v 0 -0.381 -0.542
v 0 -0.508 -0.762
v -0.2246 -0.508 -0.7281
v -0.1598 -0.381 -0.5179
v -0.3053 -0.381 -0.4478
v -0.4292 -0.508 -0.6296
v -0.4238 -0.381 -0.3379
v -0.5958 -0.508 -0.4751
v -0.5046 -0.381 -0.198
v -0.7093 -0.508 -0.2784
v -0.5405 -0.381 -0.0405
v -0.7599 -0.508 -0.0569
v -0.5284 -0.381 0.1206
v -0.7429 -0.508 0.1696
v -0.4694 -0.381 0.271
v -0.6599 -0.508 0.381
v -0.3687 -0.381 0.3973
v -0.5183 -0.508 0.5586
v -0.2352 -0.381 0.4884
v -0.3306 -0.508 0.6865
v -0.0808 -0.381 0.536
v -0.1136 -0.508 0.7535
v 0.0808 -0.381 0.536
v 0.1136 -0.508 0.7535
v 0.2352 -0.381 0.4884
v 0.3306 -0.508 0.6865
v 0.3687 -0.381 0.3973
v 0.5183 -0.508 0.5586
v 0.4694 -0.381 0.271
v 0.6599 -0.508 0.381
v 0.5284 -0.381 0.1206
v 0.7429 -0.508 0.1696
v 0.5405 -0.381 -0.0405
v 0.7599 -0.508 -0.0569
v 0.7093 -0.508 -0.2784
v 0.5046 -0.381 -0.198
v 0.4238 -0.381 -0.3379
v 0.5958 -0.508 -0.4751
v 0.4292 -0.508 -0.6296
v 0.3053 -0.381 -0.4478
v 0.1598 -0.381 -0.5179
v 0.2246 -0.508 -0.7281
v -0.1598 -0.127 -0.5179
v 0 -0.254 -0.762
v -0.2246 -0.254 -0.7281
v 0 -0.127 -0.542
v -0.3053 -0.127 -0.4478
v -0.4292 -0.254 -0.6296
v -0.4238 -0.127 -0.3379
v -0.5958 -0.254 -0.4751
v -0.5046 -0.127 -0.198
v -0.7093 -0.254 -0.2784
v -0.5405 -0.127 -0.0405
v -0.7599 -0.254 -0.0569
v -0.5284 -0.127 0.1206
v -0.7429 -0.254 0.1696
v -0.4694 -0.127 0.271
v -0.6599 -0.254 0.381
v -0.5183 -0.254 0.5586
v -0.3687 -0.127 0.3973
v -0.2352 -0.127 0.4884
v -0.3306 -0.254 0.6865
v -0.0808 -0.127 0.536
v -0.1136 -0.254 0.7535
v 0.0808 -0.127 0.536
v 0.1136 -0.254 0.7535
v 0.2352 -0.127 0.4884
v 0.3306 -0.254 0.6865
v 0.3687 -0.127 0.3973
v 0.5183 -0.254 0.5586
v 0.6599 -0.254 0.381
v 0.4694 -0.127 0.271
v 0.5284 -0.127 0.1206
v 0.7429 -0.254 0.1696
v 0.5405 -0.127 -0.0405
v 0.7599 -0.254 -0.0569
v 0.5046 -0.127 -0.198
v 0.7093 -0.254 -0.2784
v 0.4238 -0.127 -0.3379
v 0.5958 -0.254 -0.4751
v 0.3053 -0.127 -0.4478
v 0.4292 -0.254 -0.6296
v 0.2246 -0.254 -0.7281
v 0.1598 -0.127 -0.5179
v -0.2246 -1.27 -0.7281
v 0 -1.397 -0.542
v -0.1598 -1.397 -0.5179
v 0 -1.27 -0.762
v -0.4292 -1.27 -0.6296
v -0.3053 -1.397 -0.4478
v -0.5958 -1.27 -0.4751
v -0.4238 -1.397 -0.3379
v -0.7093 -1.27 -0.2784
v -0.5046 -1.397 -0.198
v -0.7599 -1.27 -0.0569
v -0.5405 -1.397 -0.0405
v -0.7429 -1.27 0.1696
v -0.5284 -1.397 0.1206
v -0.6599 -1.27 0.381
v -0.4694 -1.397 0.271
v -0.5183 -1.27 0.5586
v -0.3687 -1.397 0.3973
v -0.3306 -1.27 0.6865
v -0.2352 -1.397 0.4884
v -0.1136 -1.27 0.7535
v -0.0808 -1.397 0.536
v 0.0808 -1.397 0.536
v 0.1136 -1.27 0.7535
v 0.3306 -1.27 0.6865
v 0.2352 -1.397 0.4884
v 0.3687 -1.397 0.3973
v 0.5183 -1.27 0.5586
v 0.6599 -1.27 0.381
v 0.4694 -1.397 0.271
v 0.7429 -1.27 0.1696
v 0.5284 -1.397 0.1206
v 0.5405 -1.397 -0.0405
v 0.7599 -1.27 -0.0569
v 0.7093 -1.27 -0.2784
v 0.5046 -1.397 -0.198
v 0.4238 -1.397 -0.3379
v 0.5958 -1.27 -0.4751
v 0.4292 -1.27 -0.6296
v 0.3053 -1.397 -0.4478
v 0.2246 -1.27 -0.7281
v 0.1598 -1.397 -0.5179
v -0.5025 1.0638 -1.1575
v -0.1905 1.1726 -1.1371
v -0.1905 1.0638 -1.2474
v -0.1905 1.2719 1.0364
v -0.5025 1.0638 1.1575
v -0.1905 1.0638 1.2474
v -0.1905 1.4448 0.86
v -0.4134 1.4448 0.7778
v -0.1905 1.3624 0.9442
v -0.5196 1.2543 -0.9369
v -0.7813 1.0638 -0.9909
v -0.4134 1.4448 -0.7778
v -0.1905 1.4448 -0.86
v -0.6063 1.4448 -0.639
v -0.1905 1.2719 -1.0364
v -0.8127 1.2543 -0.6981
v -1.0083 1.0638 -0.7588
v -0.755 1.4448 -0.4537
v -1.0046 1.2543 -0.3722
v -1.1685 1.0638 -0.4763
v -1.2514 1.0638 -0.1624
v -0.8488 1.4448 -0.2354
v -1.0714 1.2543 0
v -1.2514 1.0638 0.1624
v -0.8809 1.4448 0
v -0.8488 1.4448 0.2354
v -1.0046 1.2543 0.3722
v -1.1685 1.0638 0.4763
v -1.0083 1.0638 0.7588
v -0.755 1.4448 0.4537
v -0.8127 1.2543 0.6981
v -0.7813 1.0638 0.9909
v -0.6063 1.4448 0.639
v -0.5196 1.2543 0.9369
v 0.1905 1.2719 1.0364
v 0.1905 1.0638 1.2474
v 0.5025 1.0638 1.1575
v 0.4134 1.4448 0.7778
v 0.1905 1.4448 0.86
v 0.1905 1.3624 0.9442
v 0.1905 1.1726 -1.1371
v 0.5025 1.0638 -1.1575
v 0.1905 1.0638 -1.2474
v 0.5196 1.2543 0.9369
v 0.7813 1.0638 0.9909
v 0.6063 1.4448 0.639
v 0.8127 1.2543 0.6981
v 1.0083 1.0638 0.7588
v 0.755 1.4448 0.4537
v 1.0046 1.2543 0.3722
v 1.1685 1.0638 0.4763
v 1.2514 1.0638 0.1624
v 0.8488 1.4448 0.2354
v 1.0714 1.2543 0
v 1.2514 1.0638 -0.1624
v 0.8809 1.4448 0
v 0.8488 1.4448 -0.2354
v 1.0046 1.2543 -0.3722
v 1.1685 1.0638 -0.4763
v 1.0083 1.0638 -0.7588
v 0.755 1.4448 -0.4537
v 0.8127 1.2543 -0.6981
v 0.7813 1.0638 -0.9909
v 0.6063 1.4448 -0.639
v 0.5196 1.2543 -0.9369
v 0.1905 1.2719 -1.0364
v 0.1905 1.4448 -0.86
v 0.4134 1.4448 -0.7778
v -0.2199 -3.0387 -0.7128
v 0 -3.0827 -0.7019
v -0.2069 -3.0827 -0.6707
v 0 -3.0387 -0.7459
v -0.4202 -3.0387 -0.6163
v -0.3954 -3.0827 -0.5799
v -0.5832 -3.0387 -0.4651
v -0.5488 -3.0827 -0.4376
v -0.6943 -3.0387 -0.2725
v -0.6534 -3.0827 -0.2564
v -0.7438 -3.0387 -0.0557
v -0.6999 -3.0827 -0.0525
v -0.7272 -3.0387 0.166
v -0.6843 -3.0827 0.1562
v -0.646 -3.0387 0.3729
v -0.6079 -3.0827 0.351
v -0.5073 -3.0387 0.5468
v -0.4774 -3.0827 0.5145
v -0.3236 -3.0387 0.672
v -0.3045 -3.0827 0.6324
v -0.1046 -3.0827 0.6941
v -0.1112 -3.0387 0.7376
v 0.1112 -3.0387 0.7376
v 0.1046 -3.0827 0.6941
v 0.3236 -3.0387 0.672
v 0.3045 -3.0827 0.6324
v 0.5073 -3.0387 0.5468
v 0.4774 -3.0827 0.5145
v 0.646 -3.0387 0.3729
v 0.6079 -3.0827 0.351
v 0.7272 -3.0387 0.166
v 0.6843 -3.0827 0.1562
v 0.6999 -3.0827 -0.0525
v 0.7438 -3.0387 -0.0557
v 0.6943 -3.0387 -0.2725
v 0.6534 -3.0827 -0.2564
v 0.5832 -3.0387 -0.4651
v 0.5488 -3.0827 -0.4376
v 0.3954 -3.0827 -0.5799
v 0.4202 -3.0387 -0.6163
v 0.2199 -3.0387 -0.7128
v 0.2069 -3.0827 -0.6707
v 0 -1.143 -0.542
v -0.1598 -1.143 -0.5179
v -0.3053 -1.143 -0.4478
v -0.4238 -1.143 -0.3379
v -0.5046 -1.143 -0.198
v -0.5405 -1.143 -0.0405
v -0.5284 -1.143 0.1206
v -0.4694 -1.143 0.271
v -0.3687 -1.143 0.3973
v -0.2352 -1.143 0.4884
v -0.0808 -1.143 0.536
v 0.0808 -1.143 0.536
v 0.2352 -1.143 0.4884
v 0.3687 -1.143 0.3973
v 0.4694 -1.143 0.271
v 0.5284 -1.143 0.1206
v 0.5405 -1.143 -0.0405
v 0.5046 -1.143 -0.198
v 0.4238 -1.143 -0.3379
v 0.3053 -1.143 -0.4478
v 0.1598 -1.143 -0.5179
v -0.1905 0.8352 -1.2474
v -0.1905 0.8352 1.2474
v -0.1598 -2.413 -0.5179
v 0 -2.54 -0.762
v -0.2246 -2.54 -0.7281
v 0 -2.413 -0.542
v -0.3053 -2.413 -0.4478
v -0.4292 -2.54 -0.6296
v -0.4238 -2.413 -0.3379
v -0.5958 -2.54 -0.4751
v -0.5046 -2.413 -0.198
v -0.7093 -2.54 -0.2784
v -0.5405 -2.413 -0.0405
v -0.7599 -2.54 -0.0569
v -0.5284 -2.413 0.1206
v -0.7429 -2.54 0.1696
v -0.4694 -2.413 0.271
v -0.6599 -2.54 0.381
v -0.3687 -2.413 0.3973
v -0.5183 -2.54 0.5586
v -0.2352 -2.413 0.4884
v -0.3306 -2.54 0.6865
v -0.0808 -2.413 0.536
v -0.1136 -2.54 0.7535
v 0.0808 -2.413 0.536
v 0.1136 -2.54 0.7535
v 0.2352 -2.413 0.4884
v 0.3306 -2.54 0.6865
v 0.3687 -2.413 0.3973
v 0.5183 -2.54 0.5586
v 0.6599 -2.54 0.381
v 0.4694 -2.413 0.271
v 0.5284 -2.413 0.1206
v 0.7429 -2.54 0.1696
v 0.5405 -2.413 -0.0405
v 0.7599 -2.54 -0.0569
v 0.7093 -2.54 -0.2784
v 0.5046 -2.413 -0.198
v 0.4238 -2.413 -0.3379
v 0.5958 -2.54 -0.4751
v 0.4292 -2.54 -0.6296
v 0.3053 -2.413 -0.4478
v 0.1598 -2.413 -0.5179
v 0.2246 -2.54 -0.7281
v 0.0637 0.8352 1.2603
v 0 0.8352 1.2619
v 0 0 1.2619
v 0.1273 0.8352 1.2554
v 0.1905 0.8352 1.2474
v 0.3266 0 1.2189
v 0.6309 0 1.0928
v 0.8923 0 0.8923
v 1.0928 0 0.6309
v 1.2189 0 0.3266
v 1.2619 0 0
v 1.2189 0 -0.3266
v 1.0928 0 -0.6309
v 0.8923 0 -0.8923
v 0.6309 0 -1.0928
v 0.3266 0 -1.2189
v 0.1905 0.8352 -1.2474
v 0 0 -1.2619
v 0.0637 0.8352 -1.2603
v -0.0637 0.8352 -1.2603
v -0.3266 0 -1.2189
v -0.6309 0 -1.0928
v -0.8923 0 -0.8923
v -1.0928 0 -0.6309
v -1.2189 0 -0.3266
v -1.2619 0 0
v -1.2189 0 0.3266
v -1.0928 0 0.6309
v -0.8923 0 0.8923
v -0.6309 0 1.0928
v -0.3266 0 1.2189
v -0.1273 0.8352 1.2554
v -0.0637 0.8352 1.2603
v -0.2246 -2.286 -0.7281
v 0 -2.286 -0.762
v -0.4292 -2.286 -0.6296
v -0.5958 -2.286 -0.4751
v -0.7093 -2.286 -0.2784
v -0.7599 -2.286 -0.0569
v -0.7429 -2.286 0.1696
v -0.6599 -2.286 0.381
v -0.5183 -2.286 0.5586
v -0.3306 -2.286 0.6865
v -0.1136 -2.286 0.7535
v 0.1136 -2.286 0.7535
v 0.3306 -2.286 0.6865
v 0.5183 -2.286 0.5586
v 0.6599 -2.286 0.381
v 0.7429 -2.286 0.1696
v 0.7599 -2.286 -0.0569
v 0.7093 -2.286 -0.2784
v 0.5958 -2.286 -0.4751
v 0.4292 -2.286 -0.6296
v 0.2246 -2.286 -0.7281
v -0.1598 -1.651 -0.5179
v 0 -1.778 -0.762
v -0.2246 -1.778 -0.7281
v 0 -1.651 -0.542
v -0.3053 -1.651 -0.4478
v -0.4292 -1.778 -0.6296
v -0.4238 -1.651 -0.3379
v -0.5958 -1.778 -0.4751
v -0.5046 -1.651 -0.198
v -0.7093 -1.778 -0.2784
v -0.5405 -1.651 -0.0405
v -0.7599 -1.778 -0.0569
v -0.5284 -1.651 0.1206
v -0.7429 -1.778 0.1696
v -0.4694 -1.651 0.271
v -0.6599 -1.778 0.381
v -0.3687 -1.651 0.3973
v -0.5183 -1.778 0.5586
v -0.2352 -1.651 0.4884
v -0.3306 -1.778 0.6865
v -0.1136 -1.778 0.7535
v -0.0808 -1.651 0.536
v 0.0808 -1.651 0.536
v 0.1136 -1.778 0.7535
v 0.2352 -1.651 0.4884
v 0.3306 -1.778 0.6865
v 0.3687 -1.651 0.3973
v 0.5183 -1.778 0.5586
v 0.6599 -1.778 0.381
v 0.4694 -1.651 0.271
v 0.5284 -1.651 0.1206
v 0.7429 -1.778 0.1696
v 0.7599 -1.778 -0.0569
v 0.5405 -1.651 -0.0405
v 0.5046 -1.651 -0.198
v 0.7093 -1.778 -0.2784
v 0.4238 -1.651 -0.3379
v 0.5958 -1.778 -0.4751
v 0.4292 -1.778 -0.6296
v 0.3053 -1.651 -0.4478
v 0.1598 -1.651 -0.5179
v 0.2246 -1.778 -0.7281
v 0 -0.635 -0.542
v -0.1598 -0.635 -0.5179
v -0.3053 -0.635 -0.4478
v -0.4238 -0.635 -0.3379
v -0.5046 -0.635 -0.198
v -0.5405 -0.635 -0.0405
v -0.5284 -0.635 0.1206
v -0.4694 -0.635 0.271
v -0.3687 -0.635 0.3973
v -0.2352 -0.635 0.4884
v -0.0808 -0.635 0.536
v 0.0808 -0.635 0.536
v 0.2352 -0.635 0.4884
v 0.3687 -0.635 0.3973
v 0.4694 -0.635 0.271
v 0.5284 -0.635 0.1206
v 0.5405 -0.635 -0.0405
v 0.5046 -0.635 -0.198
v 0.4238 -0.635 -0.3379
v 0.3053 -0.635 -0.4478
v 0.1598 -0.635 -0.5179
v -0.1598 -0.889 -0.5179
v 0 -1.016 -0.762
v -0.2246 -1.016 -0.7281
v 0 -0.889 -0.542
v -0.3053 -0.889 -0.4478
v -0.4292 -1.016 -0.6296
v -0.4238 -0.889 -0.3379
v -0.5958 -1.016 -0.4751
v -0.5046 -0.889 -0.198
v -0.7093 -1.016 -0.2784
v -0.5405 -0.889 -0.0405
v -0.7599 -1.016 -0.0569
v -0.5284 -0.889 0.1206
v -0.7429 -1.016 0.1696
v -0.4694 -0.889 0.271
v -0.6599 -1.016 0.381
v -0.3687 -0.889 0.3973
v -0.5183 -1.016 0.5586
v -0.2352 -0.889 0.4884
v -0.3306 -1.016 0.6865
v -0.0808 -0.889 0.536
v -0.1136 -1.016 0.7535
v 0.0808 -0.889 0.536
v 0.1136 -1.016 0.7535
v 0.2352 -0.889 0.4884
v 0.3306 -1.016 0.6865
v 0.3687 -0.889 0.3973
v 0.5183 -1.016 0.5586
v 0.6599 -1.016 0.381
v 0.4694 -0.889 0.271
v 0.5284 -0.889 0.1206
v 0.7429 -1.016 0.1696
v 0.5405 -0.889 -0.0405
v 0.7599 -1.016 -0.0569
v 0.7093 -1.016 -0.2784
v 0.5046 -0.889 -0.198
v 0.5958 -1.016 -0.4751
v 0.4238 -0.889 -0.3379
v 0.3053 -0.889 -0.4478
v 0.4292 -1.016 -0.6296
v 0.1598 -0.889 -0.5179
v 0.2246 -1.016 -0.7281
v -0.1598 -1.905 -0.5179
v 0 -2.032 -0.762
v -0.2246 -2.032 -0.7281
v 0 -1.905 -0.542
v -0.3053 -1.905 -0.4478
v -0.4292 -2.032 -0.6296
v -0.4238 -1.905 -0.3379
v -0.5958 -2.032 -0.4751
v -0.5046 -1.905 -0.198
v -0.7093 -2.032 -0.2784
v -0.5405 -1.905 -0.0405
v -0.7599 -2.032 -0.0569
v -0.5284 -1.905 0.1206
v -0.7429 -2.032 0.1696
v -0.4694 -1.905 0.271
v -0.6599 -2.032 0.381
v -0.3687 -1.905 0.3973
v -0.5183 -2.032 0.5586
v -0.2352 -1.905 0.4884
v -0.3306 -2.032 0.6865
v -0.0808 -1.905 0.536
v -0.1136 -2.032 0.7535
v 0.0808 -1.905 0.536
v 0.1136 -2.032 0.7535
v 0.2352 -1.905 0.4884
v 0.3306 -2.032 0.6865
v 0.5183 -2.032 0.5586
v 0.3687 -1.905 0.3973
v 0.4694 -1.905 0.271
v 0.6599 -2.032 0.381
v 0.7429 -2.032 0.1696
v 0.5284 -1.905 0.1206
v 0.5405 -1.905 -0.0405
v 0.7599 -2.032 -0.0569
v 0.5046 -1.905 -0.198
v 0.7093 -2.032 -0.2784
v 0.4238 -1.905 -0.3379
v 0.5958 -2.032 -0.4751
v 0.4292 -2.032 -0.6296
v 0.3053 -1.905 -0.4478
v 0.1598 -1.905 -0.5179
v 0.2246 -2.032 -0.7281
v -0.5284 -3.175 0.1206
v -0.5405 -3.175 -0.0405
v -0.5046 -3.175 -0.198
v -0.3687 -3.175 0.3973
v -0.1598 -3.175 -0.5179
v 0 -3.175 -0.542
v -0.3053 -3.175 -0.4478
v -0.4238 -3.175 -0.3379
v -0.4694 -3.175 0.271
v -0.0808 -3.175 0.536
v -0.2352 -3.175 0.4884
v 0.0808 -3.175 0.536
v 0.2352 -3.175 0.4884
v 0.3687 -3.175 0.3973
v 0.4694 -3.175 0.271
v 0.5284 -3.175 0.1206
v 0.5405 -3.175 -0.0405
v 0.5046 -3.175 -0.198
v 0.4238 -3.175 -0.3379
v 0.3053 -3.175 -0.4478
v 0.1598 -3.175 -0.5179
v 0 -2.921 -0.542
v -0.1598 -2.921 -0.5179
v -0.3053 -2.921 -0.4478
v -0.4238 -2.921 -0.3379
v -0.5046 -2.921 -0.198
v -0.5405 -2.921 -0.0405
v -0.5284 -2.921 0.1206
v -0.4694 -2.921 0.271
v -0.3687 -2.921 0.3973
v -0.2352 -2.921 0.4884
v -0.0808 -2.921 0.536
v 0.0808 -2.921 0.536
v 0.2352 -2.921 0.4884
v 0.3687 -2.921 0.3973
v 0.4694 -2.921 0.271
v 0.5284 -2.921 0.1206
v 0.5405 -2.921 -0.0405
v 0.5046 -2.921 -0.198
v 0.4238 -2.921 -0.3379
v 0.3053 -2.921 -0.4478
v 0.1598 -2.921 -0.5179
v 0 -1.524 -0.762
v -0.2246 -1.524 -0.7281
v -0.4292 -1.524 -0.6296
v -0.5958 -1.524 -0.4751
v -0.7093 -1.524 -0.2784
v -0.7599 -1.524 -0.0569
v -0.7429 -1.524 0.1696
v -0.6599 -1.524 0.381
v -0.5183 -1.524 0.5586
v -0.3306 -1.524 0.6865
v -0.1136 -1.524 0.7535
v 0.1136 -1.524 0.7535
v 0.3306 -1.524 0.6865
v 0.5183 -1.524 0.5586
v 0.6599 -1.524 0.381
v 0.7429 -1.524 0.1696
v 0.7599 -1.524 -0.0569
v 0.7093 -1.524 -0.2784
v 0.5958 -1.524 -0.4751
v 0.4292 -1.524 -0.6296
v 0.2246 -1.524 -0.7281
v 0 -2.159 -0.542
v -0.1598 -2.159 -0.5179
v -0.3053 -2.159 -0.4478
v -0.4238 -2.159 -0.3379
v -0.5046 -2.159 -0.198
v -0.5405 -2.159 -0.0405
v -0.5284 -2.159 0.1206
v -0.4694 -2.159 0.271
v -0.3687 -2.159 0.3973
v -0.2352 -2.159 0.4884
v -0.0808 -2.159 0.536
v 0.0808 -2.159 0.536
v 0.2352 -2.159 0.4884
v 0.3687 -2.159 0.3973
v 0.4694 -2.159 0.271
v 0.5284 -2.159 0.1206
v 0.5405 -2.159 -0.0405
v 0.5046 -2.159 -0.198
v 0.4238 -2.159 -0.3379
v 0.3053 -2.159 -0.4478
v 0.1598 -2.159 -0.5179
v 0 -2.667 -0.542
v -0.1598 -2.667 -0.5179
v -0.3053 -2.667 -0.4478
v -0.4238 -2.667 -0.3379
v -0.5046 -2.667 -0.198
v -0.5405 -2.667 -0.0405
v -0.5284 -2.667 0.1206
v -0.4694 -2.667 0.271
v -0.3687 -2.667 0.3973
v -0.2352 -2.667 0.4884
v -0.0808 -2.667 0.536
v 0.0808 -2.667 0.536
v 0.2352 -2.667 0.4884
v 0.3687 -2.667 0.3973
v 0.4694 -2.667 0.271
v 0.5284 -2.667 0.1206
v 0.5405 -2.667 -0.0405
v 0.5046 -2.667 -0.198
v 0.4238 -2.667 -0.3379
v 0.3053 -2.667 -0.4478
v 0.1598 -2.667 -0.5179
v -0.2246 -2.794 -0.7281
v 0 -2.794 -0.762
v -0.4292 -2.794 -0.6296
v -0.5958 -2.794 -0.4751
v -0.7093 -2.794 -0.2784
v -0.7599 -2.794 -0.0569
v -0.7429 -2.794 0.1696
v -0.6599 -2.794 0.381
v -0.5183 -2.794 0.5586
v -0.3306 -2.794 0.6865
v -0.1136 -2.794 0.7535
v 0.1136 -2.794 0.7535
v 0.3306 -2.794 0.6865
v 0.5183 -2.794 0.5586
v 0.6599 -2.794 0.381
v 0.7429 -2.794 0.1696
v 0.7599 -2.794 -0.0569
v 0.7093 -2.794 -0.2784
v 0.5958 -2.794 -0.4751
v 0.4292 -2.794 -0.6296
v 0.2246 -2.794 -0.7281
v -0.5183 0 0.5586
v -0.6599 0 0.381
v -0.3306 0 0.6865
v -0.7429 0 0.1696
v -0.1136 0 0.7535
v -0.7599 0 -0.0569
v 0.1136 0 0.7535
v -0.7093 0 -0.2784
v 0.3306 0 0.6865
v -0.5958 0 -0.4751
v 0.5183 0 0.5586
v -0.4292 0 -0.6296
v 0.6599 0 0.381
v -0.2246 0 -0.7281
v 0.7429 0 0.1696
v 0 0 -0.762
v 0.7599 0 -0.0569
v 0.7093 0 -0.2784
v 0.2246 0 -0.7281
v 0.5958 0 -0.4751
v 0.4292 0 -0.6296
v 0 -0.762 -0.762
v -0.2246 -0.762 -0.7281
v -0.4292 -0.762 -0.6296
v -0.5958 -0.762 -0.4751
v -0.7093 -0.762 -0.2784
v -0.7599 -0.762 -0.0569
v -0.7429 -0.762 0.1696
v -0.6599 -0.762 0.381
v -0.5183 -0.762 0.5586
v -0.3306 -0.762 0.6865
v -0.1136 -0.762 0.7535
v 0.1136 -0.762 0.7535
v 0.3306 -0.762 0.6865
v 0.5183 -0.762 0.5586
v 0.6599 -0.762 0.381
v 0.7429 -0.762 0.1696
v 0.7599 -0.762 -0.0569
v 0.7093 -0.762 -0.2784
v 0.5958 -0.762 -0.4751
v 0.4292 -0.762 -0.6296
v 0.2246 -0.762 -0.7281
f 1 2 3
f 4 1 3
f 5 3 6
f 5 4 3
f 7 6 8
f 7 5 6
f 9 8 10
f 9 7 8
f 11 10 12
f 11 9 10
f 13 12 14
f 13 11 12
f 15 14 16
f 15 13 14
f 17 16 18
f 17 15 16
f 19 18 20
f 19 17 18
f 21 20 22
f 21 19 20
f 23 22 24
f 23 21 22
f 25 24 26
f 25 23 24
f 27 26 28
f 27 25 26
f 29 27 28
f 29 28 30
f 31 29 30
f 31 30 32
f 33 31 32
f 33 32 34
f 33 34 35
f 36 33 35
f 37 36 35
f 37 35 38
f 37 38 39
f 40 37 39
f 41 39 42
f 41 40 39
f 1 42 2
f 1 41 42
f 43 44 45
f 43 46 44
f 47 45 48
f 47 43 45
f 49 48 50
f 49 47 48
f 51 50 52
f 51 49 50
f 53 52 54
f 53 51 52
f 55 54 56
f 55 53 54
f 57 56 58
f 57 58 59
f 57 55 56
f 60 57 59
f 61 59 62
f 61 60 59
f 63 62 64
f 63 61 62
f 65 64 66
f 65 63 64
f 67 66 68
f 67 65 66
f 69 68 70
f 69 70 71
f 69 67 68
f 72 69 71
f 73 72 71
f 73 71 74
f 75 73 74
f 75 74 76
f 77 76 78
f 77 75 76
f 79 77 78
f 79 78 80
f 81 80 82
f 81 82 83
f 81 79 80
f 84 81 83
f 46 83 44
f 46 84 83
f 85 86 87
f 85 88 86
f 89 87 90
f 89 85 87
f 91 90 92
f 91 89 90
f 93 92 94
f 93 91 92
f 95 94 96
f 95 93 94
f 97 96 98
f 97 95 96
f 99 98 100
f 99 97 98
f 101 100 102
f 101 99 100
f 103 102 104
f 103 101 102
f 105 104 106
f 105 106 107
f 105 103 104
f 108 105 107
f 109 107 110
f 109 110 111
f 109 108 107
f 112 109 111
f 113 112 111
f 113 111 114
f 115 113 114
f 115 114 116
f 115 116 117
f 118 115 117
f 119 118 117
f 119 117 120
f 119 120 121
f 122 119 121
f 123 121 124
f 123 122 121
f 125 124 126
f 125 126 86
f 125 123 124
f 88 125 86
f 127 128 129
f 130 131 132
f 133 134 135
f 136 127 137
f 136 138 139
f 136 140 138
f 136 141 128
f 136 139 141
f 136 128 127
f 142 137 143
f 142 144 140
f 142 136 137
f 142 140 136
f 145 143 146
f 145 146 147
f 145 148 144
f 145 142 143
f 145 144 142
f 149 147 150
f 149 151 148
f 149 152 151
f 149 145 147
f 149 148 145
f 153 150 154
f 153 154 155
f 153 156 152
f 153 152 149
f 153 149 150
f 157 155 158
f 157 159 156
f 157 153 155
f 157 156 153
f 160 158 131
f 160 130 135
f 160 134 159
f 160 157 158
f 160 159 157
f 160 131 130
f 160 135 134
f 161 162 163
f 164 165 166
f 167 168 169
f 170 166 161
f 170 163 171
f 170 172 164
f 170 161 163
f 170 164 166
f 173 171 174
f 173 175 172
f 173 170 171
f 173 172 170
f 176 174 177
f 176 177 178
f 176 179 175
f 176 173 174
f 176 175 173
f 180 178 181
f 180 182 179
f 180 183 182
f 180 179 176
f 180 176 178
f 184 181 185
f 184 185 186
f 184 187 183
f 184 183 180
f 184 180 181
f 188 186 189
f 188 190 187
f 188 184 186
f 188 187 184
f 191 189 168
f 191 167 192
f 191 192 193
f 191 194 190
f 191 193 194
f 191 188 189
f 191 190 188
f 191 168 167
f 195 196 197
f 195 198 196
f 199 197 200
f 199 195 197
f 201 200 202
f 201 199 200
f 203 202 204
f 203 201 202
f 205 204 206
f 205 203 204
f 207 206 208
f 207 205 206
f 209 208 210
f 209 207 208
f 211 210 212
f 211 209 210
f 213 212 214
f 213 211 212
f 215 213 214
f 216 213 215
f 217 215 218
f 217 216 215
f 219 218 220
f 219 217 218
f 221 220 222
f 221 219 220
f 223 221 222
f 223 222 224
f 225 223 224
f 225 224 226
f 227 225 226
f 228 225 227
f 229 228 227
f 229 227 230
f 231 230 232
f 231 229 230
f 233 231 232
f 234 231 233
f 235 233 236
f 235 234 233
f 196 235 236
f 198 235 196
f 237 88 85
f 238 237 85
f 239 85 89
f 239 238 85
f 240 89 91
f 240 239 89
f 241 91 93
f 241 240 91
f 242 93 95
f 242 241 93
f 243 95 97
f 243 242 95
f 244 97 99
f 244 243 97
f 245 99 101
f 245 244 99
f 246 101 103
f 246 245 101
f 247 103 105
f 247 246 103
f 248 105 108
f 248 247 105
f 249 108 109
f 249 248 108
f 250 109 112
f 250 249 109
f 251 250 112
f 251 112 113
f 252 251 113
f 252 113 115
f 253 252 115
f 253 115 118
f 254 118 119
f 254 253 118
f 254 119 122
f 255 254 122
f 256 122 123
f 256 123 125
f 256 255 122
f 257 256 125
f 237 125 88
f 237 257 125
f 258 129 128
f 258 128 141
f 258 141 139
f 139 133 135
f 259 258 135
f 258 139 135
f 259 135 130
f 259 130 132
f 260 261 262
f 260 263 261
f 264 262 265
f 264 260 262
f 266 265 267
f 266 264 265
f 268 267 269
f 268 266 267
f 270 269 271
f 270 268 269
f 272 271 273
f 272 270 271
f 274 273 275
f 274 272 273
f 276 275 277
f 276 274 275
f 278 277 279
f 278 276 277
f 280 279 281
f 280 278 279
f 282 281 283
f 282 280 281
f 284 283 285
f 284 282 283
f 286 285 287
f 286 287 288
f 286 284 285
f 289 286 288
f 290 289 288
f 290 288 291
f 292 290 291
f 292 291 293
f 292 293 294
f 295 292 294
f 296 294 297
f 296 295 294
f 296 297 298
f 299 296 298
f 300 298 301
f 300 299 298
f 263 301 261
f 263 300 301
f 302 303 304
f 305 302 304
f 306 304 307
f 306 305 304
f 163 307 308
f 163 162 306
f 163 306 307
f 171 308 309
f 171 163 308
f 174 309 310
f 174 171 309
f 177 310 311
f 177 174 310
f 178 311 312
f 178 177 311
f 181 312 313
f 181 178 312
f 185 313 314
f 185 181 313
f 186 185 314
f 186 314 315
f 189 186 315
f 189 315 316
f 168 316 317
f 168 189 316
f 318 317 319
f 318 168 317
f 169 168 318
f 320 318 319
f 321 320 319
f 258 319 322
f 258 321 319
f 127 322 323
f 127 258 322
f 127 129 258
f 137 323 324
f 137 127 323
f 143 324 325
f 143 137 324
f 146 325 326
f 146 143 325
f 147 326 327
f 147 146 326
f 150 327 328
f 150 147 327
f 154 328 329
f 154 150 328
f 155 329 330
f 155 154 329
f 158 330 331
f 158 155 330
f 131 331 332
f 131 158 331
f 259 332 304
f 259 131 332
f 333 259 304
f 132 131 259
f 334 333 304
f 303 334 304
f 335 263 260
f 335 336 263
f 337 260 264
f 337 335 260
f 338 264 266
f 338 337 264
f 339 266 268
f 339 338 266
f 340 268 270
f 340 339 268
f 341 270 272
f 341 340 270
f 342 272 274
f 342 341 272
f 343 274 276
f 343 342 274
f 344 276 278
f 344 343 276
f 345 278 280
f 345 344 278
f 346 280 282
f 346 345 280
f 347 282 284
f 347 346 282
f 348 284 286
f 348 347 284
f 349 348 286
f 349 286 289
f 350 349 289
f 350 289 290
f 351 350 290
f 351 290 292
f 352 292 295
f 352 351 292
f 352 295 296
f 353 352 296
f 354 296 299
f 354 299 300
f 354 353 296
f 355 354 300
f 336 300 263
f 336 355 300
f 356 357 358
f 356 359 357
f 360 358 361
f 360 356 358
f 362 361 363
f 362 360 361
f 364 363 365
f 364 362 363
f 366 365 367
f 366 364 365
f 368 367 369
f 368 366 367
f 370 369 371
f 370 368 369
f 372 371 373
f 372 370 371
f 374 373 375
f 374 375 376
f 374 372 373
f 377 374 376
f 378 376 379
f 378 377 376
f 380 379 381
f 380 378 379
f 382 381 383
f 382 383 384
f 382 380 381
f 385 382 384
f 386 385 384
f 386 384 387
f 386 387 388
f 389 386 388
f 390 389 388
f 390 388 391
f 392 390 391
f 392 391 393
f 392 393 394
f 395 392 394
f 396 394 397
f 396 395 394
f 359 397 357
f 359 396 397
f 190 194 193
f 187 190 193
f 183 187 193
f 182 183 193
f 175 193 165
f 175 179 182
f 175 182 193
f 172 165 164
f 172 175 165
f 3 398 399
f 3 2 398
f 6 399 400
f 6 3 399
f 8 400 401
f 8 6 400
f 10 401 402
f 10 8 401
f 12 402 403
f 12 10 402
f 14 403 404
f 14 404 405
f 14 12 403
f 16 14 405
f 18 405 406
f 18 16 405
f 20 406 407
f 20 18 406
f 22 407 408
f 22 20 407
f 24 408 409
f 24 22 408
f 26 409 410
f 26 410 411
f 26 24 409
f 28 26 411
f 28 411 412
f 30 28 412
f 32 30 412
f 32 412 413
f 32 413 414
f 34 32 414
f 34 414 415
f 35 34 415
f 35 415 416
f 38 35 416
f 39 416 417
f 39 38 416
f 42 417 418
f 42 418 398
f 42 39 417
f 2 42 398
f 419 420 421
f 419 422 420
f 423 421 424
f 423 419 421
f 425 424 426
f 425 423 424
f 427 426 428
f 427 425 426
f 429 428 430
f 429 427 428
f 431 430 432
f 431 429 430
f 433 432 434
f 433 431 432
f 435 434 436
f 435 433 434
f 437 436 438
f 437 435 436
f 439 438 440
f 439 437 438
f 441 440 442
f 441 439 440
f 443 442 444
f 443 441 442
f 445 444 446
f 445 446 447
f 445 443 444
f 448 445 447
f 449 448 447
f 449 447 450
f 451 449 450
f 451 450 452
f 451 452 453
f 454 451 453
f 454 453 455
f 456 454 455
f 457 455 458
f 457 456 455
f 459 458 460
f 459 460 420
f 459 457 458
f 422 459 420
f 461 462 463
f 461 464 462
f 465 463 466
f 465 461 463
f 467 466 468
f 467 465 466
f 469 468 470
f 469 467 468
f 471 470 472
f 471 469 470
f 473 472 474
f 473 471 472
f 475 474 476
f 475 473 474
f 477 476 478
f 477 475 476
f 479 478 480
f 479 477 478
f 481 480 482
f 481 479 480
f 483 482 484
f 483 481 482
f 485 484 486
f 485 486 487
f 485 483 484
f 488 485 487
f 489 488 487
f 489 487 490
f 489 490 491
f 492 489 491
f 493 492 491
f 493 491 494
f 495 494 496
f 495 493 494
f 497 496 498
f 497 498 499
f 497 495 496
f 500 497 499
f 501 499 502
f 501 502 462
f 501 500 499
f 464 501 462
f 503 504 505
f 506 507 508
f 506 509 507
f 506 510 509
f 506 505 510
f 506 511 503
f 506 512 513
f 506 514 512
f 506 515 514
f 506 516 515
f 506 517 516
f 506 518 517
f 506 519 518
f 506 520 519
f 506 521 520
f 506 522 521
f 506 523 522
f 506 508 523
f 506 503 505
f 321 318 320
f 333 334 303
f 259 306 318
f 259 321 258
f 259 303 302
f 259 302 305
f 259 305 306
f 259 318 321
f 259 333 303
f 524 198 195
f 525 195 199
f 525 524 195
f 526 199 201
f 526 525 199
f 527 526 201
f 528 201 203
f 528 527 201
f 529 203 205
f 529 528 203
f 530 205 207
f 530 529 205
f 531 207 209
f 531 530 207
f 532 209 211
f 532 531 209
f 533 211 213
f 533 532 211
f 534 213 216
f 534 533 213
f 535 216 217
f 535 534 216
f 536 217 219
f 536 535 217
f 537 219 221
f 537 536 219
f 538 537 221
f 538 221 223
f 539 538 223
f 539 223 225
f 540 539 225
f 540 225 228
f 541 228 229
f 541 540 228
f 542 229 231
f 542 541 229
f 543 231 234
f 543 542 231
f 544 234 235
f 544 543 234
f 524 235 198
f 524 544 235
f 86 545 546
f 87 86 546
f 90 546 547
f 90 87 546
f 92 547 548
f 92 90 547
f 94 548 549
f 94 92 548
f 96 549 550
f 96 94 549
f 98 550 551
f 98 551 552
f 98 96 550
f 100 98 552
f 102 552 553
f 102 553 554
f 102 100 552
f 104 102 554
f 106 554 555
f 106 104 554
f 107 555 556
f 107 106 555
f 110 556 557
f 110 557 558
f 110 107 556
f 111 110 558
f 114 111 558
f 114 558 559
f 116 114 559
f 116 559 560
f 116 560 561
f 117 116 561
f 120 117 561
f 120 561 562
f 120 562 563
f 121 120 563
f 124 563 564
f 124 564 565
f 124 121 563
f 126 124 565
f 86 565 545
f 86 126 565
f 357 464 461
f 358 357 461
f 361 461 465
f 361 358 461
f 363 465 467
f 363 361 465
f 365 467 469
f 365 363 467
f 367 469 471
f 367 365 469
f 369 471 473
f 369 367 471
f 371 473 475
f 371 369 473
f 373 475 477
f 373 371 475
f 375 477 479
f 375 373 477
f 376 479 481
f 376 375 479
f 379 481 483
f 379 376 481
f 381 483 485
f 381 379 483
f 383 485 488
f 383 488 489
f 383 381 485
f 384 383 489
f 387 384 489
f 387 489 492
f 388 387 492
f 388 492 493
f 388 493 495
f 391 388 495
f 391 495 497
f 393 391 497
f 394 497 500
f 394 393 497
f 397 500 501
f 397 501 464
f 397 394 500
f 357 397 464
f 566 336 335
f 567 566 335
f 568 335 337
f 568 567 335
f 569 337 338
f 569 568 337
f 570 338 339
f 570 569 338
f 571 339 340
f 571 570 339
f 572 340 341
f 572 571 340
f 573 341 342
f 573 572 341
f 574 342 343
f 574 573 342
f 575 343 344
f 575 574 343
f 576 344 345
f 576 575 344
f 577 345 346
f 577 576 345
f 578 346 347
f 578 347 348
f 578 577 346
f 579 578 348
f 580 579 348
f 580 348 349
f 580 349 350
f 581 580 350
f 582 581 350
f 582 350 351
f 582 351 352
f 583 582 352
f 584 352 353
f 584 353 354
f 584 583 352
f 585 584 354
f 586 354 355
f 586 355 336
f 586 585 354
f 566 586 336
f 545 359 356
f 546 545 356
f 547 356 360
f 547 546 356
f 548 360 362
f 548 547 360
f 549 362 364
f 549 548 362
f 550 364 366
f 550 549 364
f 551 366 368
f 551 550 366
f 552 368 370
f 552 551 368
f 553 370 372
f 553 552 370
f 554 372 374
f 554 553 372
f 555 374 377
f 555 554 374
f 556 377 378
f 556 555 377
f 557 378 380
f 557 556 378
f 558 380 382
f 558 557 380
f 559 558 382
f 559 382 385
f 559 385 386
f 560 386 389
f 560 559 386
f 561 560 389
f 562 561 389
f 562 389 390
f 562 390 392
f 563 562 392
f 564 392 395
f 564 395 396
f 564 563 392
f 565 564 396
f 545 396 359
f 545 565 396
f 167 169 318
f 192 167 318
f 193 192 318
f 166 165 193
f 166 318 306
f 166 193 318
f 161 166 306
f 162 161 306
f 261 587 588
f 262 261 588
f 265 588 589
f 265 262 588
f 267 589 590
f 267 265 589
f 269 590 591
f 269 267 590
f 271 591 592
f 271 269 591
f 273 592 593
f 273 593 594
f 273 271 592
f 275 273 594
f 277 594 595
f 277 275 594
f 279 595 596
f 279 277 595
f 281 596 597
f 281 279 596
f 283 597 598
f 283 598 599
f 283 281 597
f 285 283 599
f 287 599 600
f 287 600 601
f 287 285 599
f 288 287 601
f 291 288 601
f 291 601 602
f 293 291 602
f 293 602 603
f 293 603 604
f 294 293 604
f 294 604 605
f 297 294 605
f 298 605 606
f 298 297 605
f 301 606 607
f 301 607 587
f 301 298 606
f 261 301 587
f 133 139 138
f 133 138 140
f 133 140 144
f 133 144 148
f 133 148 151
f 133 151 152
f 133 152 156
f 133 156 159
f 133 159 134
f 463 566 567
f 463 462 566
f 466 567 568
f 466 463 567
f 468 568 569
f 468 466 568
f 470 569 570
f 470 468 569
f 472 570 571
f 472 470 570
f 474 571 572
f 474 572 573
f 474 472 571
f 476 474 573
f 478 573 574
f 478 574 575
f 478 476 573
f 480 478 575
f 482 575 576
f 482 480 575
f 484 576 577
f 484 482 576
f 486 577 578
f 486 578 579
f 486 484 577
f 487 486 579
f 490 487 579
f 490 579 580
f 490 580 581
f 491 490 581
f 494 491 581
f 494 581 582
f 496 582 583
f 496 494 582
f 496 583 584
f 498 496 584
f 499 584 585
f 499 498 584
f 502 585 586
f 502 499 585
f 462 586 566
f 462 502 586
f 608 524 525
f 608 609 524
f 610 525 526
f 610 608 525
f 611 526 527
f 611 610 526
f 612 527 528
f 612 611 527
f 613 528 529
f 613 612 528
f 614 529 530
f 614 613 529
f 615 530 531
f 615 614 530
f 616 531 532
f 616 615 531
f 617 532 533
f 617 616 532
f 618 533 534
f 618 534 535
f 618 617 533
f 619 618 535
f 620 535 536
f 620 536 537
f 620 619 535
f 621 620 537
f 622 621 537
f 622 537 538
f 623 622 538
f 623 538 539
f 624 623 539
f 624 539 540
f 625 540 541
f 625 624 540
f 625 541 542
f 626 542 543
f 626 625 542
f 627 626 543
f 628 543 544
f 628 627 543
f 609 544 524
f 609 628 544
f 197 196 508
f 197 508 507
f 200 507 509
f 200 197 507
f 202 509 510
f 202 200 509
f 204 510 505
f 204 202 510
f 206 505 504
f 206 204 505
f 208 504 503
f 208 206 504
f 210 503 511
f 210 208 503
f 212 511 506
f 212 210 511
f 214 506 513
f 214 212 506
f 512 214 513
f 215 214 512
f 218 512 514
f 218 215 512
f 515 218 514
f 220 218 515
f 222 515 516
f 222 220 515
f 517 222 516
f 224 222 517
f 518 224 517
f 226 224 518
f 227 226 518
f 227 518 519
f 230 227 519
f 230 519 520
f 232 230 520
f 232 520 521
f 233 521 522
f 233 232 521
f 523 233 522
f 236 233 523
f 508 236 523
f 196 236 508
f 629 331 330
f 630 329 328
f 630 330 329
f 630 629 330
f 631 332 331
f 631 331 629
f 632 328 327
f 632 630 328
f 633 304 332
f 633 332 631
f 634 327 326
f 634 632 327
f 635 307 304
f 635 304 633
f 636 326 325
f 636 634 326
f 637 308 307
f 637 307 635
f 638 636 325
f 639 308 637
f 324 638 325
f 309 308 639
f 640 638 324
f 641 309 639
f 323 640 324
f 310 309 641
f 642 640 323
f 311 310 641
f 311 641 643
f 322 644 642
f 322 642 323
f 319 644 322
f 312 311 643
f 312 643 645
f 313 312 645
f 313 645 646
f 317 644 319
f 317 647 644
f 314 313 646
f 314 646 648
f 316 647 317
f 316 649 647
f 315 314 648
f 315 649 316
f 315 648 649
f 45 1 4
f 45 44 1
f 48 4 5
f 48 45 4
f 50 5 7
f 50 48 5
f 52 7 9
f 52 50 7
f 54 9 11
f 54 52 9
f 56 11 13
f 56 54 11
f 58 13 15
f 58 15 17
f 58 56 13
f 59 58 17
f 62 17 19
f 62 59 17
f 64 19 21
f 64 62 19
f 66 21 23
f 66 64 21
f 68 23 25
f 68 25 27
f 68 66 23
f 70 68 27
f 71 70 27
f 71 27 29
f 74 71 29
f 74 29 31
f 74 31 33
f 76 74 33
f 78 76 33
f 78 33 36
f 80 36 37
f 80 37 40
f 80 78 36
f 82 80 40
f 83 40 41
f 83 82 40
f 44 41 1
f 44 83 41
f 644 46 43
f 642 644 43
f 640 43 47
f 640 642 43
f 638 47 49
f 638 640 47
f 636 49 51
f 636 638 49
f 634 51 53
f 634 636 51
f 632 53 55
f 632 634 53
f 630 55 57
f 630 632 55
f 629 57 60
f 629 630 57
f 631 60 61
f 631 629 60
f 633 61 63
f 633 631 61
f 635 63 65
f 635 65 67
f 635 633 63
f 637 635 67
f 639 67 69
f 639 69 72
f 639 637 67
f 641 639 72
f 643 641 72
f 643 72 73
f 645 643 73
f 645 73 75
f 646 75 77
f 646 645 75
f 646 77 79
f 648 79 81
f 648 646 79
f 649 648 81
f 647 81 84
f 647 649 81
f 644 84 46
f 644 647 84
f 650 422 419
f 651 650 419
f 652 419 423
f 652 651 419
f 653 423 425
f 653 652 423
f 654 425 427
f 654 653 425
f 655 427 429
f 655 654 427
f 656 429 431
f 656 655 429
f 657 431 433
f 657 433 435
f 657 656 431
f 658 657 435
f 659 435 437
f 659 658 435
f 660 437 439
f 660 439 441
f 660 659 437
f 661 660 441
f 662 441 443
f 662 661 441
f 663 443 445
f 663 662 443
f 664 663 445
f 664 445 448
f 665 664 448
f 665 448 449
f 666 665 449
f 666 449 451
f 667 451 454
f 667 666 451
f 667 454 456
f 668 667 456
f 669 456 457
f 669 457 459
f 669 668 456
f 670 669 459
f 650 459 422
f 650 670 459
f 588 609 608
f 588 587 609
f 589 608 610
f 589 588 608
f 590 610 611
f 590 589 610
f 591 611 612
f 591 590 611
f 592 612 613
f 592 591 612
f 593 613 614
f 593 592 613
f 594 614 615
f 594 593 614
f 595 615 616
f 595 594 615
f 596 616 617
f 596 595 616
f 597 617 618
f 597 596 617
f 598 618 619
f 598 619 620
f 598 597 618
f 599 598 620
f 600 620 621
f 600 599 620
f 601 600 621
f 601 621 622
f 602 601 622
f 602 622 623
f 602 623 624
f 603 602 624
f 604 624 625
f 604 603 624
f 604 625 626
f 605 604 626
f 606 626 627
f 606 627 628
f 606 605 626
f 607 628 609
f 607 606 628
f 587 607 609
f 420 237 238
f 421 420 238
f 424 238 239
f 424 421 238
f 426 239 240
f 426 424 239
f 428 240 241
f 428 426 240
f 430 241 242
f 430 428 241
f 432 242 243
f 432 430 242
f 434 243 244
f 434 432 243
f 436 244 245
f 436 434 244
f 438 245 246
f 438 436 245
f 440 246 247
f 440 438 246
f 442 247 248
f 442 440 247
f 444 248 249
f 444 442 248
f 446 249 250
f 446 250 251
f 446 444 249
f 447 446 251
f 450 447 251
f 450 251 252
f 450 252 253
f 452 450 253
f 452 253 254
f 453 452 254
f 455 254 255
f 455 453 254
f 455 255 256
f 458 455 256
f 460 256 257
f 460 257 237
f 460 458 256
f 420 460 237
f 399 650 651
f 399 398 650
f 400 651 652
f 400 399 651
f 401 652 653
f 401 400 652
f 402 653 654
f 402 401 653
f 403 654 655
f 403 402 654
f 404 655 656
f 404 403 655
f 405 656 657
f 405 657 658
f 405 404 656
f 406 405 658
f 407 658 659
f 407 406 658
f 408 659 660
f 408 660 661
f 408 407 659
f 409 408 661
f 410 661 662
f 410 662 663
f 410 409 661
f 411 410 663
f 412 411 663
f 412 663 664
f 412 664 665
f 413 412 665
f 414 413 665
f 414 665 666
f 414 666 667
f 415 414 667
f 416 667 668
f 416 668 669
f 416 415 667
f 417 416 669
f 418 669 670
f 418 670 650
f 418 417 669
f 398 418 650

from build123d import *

# Parameters (mm, degrees)
SKETCH2_W            = 0.381
SKETCH2_H            = 32.152963302
HEX_CUT_DRIVEN_DEPTH = 0.6096


with BuildPart() as part:
    # Sketch3 → Shank Revolve ( driven ) (revolve)
    with BuildSketch(Plane.XY, mode=Mode.PRIVATE) as shank_revolve_driven_sk:
        Polygon((0, 0.835152), (0, -3.175), (0.6096, -3.175), (0.762, -3.0226), (0.762, 0.835152), align=None)
    revolve(shank_revolve_driven_sk.sketch.rotate(Axis((0, -50, 0), (0, 1, 0)), 90), axis=Axis((0, -50, 0), (0, 1, 0)))

    # Sketch4 → Thread Revolve Cut ( driven ) (revolve, cut)
    with BuildSketch(Plane.XY, mode=Mode.PRIVATE) as thread_revolve_cut_driven_sk:
        Polygon((0.542029547, 0.635), (0.762, 0.762), (1.27, 0.762), (1.27, -3.81), (0.762, -3.81), (0.542029547, -3.683), (0.762, -3.556), (0.542029547, -3.429), (0.762, -3.302), (0.542029547, -3.175), (0.762, -3.048), (0.542029547, -2.921), (0.762, -2.794), (0.542029547, -2.667), (0.762, -2.54), (0.542029547, -2.413), (0.762, -2.286), (0.542029547, -2.159), (0.762, -2.032), (0.542029547, -1.905), (0.762, -1.778), (0.542029547, -1.651), (0.762, -1.524), (0.542029547, -1.397), (0.762, -1.27), (0.542029547, -1.143), (0.762, -1.016), (0.542029547, -0.889), (0.762, -0.762), (0.542029547, -0.635), (0.762, -0.508), (0.542029547, -0.381), (0.762, -0.254), (0.542029547, -0.127), (0.762, 0), (0.542029547, 0.127), (0.762, 0.254), (0.542029547, 0.381), (0.762, 0.508), align=None)
    revolve(thread_revolve_cut_driven_sk.sketch.rotate(Axis((0, -50, 0), (0, 1, 0)), 90), axis=Axis((0, -50, 0), (0, 1, 0)), mode=Mode.SUBTRACT)

    # Sketch5 → Head Revolve ( driven ) (revolve)
    with BuildSketch(Plane.XY, mode=Mode.PRIVATE) as head_revolve_driven_sk:
        Polygon((0, 1.444752), (0, 0), (1.261872, 0), (1.261872, 1.063752), (0.880872, 1.444752), align=None)
    revolve(head_revolve_driven_sk.sketch.rotate(Axis((0, -50, 0), (0, 1, 0)), 270), axis=Axis((0, -50, 0), (0, 1, 0)))

    # Sketch2 → Hex Cut ( driven ) (cut)
    with BuildSketch(Plane(origin=(0, 1.444752, 0), x_dir=(-1, 0, 0), z_dir=(0, 1, 0))):
        Rectangle(SKETCH2_W, SKETCH2_H)
    extrude(amount=-HEX_CUT_DRIVEN_DEPTH, mode=Mode.SUBTRACT)


solid = part.part
